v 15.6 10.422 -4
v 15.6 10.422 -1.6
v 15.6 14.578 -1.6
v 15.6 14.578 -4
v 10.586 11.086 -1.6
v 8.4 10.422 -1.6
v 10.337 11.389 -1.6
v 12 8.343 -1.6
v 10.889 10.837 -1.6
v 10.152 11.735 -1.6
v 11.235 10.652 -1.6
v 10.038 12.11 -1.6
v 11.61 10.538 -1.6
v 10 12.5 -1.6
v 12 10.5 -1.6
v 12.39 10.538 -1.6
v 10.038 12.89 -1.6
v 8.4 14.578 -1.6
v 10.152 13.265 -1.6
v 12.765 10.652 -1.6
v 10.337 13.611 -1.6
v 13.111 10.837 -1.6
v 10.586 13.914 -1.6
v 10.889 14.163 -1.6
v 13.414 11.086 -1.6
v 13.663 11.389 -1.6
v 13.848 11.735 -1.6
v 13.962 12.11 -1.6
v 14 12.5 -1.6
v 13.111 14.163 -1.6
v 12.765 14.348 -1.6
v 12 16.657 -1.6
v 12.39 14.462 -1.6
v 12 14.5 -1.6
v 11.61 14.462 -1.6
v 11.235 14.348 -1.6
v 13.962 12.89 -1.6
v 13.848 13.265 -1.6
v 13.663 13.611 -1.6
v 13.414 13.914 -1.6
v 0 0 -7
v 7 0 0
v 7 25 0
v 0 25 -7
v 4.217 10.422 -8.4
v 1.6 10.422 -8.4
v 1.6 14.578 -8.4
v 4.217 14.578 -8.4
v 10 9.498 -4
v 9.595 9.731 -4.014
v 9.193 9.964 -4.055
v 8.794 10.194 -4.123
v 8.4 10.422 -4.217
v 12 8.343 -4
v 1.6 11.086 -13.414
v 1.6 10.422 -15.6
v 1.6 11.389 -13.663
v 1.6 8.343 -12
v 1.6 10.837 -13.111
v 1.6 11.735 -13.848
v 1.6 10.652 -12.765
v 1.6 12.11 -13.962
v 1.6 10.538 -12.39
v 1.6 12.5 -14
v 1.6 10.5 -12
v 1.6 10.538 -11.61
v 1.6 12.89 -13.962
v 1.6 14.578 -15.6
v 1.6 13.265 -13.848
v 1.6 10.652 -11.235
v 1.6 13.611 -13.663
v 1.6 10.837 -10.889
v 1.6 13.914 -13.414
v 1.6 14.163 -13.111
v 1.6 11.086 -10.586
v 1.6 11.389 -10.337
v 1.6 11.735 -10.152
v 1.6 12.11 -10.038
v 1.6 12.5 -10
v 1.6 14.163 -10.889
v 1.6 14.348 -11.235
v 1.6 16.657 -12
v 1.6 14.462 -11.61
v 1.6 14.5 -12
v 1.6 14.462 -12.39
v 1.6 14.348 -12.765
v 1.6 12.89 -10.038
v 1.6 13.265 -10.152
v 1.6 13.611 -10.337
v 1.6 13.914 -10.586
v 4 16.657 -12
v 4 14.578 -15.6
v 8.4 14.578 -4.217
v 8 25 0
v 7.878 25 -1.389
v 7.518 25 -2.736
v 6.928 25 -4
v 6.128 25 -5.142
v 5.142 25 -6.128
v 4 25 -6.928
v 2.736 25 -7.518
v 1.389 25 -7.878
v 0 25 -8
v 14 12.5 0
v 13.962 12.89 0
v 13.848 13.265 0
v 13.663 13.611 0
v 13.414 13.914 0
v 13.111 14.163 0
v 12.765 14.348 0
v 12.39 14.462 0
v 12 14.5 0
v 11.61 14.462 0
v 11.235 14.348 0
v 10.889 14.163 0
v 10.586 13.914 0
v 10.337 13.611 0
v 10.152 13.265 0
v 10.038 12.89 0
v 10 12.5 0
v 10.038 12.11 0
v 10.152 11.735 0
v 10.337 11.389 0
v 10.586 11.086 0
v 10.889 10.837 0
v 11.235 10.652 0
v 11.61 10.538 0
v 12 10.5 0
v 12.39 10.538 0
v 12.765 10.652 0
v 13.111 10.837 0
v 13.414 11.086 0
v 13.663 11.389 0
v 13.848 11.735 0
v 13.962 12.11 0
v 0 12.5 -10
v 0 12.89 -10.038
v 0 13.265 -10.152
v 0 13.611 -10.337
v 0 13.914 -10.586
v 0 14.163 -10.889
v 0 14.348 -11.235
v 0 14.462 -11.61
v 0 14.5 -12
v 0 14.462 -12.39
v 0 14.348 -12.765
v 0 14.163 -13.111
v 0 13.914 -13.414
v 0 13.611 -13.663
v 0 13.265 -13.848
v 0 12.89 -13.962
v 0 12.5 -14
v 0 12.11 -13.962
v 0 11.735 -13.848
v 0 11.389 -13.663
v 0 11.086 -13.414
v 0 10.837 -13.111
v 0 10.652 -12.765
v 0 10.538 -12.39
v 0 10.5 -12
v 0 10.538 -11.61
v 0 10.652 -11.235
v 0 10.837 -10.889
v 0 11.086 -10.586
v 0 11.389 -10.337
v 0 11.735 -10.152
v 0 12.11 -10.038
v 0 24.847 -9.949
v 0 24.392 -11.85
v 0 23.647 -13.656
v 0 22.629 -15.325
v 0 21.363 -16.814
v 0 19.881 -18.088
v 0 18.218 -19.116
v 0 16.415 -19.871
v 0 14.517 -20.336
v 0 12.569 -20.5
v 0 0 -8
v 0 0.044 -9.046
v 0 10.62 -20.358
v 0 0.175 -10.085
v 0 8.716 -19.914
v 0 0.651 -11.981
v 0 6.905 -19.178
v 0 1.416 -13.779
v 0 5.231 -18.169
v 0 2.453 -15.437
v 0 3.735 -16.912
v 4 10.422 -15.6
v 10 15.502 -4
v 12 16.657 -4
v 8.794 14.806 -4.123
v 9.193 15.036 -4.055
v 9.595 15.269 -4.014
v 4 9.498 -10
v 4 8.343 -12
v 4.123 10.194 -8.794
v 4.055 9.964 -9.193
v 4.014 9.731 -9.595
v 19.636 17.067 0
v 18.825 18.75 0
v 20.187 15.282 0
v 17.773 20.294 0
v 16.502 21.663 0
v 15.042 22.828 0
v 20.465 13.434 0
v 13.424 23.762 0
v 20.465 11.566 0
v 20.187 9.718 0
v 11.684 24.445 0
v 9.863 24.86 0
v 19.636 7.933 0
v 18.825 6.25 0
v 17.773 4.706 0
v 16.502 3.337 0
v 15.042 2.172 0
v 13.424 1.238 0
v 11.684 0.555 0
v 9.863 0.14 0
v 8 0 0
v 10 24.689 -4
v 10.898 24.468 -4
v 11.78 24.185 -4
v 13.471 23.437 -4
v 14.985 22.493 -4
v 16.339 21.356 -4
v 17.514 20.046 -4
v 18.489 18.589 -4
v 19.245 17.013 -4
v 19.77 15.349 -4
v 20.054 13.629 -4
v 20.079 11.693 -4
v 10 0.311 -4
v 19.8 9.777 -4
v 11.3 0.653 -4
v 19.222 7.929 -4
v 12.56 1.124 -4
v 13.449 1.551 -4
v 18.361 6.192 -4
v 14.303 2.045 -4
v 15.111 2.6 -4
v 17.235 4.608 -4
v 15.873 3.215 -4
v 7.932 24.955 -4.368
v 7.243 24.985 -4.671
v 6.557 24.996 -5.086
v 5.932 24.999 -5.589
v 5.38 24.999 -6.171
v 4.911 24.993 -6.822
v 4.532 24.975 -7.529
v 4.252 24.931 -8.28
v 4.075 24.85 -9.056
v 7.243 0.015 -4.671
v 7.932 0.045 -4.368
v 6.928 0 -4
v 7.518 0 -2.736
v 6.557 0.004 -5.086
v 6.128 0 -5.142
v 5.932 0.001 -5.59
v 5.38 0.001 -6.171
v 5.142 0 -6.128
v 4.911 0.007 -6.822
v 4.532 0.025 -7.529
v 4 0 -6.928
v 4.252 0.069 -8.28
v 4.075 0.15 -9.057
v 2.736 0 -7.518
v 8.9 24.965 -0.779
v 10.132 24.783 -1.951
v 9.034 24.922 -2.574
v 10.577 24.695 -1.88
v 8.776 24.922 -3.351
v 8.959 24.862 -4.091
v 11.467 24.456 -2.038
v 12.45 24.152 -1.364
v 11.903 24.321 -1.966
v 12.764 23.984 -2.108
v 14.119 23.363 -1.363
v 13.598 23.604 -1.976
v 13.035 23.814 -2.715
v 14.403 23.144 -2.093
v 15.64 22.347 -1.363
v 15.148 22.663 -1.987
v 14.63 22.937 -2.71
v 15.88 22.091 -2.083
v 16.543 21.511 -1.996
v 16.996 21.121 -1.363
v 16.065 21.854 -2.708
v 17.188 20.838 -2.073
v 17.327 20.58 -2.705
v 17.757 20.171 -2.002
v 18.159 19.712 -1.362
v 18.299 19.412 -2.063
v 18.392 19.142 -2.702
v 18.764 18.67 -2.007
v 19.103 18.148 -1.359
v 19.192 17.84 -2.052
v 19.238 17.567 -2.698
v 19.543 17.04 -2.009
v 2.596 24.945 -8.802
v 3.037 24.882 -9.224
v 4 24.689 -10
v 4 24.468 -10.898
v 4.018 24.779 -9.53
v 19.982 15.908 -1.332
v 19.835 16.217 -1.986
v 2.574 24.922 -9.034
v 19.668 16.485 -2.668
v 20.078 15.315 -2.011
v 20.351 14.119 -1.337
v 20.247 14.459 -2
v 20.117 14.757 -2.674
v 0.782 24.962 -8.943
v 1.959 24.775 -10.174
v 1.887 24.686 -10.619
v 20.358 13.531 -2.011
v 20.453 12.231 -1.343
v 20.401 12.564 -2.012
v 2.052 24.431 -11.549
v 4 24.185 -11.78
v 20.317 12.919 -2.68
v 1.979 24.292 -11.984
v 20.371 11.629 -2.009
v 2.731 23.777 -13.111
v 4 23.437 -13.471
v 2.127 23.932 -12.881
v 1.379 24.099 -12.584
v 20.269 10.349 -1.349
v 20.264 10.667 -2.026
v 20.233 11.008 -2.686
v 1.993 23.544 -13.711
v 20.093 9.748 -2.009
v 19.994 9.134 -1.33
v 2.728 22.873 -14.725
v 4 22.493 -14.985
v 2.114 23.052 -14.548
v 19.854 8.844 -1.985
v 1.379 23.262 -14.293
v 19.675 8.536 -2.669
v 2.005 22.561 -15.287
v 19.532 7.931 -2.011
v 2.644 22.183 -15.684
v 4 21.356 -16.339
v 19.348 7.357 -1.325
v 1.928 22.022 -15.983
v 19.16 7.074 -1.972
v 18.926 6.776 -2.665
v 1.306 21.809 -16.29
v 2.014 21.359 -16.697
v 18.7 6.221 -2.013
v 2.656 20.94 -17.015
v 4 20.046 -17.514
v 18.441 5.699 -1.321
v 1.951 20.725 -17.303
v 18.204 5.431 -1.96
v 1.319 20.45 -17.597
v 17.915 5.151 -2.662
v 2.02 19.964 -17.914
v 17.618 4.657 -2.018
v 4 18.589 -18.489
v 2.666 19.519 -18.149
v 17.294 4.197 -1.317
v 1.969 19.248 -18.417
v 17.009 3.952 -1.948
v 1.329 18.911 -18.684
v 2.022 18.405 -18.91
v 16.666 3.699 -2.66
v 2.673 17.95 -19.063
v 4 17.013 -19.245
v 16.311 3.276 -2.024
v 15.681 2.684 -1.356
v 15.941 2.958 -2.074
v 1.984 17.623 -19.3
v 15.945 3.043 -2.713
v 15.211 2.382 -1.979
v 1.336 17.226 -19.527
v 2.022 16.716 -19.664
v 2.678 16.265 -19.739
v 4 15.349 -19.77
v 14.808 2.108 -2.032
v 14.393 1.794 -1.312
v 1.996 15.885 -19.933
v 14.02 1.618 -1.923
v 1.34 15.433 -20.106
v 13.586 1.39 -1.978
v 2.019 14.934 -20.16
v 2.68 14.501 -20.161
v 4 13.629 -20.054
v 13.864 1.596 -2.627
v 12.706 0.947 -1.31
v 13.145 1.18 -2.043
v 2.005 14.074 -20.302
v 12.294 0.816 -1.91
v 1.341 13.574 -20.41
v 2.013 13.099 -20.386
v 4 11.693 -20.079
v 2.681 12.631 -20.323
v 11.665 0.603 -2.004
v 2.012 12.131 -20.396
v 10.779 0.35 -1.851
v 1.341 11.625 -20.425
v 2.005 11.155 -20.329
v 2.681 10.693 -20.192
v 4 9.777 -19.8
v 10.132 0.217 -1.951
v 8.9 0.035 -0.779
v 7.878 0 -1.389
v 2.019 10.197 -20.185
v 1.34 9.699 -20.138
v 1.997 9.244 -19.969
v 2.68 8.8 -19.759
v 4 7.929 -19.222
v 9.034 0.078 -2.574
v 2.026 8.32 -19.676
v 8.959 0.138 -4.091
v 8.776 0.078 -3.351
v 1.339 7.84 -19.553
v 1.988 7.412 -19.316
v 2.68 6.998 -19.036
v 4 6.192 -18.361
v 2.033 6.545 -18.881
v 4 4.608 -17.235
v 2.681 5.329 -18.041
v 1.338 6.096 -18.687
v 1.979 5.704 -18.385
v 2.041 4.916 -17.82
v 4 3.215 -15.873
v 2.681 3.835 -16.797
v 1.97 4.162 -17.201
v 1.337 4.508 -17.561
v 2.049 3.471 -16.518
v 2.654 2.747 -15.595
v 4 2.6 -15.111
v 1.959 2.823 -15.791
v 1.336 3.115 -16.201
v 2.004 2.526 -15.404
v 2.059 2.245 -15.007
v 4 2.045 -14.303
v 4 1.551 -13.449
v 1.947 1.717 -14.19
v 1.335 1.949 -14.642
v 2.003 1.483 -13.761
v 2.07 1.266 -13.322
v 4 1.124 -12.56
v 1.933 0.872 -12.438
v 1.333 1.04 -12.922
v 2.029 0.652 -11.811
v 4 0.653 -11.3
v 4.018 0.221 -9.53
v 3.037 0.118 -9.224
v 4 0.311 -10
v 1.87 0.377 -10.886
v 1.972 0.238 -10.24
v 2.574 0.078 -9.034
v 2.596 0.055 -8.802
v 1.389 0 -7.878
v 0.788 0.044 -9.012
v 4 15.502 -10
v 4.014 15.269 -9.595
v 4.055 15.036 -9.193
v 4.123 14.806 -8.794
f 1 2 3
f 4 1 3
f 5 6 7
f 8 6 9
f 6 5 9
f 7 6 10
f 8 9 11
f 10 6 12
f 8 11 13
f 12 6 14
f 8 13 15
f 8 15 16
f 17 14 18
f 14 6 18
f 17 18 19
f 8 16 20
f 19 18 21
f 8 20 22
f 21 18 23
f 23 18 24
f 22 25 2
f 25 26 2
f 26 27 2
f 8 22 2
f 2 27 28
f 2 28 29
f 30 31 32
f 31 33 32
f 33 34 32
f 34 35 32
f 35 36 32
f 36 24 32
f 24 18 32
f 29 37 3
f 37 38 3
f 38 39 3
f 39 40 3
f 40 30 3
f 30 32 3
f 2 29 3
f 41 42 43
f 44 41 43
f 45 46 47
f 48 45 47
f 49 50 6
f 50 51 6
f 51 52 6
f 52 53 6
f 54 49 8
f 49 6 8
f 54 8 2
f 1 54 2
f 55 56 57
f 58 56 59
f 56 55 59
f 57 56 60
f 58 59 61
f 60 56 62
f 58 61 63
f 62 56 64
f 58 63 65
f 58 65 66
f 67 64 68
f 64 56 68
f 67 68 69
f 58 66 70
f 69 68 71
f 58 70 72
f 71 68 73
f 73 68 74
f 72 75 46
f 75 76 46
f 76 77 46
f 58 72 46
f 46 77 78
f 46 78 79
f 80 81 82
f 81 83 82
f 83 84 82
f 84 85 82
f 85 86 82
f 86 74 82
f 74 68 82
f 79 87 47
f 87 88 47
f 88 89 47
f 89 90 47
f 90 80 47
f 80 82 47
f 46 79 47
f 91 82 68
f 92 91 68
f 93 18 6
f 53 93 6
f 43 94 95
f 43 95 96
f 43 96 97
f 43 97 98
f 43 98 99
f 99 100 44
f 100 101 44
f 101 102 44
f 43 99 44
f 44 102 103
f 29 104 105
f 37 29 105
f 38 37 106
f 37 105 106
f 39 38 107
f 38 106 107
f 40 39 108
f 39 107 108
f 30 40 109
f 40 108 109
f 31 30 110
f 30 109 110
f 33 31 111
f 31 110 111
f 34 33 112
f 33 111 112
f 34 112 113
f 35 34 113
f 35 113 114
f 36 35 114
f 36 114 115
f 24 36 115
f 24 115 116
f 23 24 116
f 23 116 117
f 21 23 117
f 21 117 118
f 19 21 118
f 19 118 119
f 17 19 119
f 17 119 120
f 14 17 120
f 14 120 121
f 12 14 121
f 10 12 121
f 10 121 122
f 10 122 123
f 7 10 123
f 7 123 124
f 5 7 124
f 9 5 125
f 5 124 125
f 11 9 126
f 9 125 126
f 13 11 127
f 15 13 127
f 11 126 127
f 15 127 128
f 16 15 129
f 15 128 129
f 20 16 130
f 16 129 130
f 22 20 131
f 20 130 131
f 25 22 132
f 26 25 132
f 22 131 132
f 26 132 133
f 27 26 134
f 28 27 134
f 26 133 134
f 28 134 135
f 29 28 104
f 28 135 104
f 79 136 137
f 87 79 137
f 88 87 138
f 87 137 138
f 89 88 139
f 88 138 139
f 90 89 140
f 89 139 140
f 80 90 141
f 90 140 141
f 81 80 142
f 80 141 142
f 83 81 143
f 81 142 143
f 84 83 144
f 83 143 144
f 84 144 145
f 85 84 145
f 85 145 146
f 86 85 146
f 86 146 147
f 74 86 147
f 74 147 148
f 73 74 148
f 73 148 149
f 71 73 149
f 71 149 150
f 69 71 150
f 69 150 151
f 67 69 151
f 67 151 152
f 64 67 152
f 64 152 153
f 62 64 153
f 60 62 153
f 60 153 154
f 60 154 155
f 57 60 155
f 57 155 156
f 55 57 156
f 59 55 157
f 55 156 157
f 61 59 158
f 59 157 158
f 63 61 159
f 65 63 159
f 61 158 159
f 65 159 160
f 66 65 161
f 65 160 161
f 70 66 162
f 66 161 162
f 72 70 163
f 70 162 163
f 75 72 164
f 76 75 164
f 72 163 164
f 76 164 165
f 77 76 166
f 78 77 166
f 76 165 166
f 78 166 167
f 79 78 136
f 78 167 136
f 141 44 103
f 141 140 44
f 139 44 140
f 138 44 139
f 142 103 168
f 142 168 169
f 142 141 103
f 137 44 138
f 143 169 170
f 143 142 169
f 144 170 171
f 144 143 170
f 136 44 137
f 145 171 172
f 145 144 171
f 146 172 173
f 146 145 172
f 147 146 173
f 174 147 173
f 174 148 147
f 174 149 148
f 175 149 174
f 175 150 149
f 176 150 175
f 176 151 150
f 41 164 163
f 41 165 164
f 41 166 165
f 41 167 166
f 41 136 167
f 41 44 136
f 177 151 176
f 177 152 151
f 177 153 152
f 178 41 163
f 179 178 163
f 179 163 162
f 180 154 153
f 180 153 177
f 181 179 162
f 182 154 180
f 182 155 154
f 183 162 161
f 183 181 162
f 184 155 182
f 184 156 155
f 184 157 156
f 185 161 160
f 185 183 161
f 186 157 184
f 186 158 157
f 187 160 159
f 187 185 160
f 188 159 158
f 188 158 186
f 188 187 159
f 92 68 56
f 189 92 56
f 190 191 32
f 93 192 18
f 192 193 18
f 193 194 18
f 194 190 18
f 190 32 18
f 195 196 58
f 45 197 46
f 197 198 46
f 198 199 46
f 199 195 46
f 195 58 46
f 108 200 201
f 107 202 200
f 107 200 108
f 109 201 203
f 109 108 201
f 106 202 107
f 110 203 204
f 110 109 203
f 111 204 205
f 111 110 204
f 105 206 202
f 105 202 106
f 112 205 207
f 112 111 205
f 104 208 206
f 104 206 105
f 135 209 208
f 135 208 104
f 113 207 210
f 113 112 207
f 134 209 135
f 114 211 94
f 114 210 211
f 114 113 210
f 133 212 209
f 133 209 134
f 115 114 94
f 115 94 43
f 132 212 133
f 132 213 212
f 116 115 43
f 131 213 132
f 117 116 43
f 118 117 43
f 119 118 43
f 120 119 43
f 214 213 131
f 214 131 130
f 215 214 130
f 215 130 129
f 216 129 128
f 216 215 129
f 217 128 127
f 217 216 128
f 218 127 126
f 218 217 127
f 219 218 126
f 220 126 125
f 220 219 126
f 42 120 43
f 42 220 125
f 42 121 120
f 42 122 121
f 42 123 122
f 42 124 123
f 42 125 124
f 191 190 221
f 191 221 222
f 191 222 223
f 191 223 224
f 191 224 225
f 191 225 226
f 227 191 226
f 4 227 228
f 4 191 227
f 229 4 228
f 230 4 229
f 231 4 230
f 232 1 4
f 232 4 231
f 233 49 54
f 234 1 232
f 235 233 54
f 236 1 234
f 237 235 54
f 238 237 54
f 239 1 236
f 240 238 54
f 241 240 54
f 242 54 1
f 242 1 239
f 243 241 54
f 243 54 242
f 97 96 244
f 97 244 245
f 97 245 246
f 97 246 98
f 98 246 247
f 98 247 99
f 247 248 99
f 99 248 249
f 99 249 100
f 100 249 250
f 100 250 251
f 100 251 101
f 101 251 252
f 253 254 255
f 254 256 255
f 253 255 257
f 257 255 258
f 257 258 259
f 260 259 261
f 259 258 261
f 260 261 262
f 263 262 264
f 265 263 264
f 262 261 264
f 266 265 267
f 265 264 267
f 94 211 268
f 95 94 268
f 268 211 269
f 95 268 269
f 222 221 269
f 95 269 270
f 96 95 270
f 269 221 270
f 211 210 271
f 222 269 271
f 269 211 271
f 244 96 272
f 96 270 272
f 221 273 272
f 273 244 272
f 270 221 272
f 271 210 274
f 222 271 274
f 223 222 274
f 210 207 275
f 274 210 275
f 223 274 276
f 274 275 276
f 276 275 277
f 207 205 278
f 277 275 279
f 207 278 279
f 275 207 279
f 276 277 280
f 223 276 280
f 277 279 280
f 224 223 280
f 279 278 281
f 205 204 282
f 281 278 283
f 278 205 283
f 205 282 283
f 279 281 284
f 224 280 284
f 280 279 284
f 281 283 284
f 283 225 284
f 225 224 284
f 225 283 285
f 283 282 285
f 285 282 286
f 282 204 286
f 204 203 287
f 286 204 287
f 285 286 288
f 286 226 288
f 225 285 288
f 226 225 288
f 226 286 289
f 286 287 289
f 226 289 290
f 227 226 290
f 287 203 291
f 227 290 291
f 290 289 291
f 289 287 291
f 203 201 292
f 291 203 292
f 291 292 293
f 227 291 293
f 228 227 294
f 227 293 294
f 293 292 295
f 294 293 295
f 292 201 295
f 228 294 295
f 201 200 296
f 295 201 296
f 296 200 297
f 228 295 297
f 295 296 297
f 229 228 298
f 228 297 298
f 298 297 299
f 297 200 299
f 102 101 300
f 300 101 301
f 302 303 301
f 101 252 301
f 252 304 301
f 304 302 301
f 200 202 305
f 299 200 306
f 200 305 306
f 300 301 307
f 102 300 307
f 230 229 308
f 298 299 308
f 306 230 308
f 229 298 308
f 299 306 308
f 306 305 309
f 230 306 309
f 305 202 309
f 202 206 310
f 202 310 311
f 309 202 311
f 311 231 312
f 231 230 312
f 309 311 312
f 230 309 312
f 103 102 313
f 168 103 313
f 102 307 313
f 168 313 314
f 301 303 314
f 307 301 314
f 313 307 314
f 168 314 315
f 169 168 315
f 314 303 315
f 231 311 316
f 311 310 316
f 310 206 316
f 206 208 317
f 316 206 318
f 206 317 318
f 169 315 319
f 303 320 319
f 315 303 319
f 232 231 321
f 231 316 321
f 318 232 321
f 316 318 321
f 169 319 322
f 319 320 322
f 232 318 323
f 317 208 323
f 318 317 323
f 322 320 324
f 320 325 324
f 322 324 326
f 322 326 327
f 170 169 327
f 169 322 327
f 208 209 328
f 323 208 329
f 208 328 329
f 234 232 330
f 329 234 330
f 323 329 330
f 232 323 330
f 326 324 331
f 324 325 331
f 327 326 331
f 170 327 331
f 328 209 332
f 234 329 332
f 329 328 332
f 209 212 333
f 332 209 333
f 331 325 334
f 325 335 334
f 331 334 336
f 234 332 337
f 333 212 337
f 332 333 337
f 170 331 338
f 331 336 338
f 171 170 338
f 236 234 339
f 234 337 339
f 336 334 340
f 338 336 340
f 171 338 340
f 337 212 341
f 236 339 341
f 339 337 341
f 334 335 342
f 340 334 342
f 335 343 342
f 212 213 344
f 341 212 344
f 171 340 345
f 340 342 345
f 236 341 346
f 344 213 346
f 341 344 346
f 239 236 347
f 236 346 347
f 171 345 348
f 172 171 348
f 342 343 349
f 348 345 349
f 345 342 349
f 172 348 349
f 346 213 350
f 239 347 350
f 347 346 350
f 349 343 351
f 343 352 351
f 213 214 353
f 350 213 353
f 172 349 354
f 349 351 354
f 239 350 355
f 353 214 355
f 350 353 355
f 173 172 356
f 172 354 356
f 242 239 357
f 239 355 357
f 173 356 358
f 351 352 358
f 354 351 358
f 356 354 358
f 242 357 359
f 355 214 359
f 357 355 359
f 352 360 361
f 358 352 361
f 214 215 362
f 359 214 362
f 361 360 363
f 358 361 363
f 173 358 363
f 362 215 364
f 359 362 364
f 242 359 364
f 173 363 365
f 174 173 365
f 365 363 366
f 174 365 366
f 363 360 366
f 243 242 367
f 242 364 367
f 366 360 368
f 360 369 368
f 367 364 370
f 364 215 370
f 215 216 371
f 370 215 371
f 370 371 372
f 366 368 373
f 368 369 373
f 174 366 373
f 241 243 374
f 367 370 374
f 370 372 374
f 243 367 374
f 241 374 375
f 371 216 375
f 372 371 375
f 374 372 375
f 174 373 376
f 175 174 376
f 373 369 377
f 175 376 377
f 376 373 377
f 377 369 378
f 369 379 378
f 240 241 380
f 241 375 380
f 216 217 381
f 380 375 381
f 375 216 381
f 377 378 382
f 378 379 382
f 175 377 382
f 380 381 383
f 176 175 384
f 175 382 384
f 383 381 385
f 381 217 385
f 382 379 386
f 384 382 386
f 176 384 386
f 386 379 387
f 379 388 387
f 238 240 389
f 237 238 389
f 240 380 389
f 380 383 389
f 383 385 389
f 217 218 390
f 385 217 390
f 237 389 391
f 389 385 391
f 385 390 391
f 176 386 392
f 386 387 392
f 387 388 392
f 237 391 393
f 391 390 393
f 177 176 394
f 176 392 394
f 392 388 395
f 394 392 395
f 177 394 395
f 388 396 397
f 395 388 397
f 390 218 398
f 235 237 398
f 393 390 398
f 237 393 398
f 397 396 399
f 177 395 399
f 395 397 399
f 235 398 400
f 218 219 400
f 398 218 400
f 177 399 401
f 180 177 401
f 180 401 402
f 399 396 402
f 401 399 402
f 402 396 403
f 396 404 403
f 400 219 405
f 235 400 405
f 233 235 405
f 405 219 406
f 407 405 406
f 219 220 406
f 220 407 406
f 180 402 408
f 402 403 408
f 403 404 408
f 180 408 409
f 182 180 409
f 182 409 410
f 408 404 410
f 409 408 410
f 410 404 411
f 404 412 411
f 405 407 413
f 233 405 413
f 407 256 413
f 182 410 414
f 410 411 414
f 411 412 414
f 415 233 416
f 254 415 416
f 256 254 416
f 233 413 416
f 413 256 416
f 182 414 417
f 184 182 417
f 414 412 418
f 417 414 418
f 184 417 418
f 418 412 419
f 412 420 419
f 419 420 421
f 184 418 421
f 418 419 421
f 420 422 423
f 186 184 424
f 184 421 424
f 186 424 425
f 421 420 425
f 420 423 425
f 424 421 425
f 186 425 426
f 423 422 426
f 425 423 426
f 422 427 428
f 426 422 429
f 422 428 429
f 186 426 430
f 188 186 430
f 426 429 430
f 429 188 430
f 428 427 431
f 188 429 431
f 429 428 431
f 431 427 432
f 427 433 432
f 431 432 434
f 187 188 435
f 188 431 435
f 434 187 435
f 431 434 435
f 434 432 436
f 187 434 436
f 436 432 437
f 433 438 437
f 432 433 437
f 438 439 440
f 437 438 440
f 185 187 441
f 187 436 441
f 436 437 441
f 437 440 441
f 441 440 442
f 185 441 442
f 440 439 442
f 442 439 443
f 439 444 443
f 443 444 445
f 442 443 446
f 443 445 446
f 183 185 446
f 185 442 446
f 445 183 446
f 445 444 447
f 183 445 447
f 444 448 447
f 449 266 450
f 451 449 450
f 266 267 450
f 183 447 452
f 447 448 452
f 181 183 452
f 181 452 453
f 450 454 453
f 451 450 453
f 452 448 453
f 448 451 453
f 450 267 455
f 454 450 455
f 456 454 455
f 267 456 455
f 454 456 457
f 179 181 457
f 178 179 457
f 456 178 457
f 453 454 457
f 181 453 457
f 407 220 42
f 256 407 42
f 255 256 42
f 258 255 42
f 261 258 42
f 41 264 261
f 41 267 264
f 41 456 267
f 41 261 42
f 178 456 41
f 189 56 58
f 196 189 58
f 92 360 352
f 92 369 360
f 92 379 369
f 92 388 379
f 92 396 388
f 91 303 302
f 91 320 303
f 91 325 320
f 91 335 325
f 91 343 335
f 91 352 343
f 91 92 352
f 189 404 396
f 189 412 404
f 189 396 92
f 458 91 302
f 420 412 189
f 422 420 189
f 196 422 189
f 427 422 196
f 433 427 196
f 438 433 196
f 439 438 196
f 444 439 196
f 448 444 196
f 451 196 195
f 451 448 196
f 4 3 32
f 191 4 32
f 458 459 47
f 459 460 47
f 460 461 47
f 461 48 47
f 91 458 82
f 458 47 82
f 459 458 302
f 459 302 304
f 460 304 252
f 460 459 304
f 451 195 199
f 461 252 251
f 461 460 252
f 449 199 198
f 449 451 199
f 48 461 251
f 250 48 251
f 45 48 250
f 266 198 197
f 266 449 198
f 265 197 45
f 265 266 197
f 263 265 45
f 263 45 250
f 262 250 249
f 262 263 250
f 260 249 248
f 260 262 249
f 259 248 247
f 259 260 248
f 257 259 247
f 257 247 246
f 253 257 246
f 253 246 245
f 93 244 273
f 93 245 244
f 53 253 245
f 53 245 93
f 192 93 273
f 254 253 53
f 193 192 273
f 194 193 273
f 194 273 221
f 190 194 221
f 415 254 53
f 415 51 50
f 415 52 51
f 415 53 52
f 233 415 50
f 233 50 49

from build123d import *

# Parameters (mm, degrees)
BOSS_EXTRUDE1_DEPTH = 25
SKETCH3_R           = 2
CUT_EXTRUDE1_DEPTH  = 21.5000001
SKETCH4_R           = 2
CUT_EXTRUDE2_DEPTH  = 21.5000001
CUT_EXTRUDE3_START  = -1.6
CUT_EXTRUDE3_DEPTH  = 19.9000001
CUT_EXTRUDE4_START  = -1.6
CUT_EXTRUDE4_DEPTH  = 19.9000001
CHAMFER1_SIZE       = 7


with BuildPart() as part:
    # Sketch1 → Boss-Extrude1 (new body)
    with BuildSketch(Plane(origin=(0, 0, 0), x_dir=(1, 0, 0), z_dir=(0, 1, 0))):
        with BuildLine():
            Line((0, 0), (0, 25))
            Line((0, 25), (4, 25))
            Line((4, 25), (4, 10))
            ThreePointArc((4, 10), (5.757359313, 5.757359313), (10, 4))
            Line((10, 4), (25, 4))
            Line((25, 4), (25, 0))
            Line((25, 0), (0, 0))
        make_face()
    extrude(amount=BOSS_EXTRUDE1_DEPTH)

    # Sketch2 → Cut-Revolve2 (revolve, cut)
    with BuildSketch(Plane.XY):
        with BuildLine():
            Line((8, 0), (0, 0))
            Line((0, 0), (0, -0.947269394))
            Line((0, -0.947269394), (27.823952472, -0.947269394))
            Line((27.823952472, -0.947269394), (27.823952472, 28.581077379))
            Line((27.823952472, 28.581077379), (0, 28.581077379))
            Line((0, 28.581077379), (0, 25))
            Line((0, 25), (8, 25))
            ThreePointArc((8, 25), (20.5, 12.5), (8, 0))
        make_face()
    revolve(axis=Axis((0, 25, 0), (0, 1, 0)), mode=Mode.SUBTRACT)

    # Sketch3 → Cut-Extrude1 (cut, through all)
    with BuildSketch(Plane.XY):
        with Locations((12, 12.5)):
            Circle(SKETCH3_R)
    extrude(amount=-CUT_EXTRUDE1_DEPTH, mode=Mode.SUBTRACT)

    # Sketch4 → Cut-Extrude2 (cut, through all)
    with BuildSketch(Plane.ZY):
        with Locations((-12, 12.5)):
            Circle(SKETCH4_R)
    extrude(amount=-CUT_EXTRUDE2_DEPTH, mode=Mode.SUBTRACT)

    # Sketch5 → Cut-Extrude3 (cut, through all)
    with BuildSketch(Plane.ZY.offset(CUT_EXTRUDE3_START)):
        Polygon((-8.4, 14.578460969), (-12, 16.656921938), (-15.6, 14.578460969), (-15.6, 10.421539031), (-12, 8.343078062), (-8.4, 10.421539031), align=None)
    extrude(amount=-CUT_EXTRUDE3_DEPTH, mode=Mode.SUBTRACT)

    # Sketch6 → Cut-Extrude4 (cut, through all)
    with BuildSketch(Plane.XY.offset(CUT_EXTRUDE4_START)):
        Polygon((12, 8.343078062), (15.6, 10.421539031), (15.6, 14.578460969), (12, 16.656921938), (8.4, 14.578460969), (8.4, 10.421539031), align=None)
    extrude(amount=-CUT_EXTRUDE4_DEPTH, mode=Mode.SUBTRACT)

    # Chamfer1
    chamfer1_edges = [part.edges().sort_by_distance(p)[0] for p in [
        (0, 12.5, 0),
    ]]
    chamfer(chamfer1_edges, length=CHAMFER1_SIZE)


solid = part.part
